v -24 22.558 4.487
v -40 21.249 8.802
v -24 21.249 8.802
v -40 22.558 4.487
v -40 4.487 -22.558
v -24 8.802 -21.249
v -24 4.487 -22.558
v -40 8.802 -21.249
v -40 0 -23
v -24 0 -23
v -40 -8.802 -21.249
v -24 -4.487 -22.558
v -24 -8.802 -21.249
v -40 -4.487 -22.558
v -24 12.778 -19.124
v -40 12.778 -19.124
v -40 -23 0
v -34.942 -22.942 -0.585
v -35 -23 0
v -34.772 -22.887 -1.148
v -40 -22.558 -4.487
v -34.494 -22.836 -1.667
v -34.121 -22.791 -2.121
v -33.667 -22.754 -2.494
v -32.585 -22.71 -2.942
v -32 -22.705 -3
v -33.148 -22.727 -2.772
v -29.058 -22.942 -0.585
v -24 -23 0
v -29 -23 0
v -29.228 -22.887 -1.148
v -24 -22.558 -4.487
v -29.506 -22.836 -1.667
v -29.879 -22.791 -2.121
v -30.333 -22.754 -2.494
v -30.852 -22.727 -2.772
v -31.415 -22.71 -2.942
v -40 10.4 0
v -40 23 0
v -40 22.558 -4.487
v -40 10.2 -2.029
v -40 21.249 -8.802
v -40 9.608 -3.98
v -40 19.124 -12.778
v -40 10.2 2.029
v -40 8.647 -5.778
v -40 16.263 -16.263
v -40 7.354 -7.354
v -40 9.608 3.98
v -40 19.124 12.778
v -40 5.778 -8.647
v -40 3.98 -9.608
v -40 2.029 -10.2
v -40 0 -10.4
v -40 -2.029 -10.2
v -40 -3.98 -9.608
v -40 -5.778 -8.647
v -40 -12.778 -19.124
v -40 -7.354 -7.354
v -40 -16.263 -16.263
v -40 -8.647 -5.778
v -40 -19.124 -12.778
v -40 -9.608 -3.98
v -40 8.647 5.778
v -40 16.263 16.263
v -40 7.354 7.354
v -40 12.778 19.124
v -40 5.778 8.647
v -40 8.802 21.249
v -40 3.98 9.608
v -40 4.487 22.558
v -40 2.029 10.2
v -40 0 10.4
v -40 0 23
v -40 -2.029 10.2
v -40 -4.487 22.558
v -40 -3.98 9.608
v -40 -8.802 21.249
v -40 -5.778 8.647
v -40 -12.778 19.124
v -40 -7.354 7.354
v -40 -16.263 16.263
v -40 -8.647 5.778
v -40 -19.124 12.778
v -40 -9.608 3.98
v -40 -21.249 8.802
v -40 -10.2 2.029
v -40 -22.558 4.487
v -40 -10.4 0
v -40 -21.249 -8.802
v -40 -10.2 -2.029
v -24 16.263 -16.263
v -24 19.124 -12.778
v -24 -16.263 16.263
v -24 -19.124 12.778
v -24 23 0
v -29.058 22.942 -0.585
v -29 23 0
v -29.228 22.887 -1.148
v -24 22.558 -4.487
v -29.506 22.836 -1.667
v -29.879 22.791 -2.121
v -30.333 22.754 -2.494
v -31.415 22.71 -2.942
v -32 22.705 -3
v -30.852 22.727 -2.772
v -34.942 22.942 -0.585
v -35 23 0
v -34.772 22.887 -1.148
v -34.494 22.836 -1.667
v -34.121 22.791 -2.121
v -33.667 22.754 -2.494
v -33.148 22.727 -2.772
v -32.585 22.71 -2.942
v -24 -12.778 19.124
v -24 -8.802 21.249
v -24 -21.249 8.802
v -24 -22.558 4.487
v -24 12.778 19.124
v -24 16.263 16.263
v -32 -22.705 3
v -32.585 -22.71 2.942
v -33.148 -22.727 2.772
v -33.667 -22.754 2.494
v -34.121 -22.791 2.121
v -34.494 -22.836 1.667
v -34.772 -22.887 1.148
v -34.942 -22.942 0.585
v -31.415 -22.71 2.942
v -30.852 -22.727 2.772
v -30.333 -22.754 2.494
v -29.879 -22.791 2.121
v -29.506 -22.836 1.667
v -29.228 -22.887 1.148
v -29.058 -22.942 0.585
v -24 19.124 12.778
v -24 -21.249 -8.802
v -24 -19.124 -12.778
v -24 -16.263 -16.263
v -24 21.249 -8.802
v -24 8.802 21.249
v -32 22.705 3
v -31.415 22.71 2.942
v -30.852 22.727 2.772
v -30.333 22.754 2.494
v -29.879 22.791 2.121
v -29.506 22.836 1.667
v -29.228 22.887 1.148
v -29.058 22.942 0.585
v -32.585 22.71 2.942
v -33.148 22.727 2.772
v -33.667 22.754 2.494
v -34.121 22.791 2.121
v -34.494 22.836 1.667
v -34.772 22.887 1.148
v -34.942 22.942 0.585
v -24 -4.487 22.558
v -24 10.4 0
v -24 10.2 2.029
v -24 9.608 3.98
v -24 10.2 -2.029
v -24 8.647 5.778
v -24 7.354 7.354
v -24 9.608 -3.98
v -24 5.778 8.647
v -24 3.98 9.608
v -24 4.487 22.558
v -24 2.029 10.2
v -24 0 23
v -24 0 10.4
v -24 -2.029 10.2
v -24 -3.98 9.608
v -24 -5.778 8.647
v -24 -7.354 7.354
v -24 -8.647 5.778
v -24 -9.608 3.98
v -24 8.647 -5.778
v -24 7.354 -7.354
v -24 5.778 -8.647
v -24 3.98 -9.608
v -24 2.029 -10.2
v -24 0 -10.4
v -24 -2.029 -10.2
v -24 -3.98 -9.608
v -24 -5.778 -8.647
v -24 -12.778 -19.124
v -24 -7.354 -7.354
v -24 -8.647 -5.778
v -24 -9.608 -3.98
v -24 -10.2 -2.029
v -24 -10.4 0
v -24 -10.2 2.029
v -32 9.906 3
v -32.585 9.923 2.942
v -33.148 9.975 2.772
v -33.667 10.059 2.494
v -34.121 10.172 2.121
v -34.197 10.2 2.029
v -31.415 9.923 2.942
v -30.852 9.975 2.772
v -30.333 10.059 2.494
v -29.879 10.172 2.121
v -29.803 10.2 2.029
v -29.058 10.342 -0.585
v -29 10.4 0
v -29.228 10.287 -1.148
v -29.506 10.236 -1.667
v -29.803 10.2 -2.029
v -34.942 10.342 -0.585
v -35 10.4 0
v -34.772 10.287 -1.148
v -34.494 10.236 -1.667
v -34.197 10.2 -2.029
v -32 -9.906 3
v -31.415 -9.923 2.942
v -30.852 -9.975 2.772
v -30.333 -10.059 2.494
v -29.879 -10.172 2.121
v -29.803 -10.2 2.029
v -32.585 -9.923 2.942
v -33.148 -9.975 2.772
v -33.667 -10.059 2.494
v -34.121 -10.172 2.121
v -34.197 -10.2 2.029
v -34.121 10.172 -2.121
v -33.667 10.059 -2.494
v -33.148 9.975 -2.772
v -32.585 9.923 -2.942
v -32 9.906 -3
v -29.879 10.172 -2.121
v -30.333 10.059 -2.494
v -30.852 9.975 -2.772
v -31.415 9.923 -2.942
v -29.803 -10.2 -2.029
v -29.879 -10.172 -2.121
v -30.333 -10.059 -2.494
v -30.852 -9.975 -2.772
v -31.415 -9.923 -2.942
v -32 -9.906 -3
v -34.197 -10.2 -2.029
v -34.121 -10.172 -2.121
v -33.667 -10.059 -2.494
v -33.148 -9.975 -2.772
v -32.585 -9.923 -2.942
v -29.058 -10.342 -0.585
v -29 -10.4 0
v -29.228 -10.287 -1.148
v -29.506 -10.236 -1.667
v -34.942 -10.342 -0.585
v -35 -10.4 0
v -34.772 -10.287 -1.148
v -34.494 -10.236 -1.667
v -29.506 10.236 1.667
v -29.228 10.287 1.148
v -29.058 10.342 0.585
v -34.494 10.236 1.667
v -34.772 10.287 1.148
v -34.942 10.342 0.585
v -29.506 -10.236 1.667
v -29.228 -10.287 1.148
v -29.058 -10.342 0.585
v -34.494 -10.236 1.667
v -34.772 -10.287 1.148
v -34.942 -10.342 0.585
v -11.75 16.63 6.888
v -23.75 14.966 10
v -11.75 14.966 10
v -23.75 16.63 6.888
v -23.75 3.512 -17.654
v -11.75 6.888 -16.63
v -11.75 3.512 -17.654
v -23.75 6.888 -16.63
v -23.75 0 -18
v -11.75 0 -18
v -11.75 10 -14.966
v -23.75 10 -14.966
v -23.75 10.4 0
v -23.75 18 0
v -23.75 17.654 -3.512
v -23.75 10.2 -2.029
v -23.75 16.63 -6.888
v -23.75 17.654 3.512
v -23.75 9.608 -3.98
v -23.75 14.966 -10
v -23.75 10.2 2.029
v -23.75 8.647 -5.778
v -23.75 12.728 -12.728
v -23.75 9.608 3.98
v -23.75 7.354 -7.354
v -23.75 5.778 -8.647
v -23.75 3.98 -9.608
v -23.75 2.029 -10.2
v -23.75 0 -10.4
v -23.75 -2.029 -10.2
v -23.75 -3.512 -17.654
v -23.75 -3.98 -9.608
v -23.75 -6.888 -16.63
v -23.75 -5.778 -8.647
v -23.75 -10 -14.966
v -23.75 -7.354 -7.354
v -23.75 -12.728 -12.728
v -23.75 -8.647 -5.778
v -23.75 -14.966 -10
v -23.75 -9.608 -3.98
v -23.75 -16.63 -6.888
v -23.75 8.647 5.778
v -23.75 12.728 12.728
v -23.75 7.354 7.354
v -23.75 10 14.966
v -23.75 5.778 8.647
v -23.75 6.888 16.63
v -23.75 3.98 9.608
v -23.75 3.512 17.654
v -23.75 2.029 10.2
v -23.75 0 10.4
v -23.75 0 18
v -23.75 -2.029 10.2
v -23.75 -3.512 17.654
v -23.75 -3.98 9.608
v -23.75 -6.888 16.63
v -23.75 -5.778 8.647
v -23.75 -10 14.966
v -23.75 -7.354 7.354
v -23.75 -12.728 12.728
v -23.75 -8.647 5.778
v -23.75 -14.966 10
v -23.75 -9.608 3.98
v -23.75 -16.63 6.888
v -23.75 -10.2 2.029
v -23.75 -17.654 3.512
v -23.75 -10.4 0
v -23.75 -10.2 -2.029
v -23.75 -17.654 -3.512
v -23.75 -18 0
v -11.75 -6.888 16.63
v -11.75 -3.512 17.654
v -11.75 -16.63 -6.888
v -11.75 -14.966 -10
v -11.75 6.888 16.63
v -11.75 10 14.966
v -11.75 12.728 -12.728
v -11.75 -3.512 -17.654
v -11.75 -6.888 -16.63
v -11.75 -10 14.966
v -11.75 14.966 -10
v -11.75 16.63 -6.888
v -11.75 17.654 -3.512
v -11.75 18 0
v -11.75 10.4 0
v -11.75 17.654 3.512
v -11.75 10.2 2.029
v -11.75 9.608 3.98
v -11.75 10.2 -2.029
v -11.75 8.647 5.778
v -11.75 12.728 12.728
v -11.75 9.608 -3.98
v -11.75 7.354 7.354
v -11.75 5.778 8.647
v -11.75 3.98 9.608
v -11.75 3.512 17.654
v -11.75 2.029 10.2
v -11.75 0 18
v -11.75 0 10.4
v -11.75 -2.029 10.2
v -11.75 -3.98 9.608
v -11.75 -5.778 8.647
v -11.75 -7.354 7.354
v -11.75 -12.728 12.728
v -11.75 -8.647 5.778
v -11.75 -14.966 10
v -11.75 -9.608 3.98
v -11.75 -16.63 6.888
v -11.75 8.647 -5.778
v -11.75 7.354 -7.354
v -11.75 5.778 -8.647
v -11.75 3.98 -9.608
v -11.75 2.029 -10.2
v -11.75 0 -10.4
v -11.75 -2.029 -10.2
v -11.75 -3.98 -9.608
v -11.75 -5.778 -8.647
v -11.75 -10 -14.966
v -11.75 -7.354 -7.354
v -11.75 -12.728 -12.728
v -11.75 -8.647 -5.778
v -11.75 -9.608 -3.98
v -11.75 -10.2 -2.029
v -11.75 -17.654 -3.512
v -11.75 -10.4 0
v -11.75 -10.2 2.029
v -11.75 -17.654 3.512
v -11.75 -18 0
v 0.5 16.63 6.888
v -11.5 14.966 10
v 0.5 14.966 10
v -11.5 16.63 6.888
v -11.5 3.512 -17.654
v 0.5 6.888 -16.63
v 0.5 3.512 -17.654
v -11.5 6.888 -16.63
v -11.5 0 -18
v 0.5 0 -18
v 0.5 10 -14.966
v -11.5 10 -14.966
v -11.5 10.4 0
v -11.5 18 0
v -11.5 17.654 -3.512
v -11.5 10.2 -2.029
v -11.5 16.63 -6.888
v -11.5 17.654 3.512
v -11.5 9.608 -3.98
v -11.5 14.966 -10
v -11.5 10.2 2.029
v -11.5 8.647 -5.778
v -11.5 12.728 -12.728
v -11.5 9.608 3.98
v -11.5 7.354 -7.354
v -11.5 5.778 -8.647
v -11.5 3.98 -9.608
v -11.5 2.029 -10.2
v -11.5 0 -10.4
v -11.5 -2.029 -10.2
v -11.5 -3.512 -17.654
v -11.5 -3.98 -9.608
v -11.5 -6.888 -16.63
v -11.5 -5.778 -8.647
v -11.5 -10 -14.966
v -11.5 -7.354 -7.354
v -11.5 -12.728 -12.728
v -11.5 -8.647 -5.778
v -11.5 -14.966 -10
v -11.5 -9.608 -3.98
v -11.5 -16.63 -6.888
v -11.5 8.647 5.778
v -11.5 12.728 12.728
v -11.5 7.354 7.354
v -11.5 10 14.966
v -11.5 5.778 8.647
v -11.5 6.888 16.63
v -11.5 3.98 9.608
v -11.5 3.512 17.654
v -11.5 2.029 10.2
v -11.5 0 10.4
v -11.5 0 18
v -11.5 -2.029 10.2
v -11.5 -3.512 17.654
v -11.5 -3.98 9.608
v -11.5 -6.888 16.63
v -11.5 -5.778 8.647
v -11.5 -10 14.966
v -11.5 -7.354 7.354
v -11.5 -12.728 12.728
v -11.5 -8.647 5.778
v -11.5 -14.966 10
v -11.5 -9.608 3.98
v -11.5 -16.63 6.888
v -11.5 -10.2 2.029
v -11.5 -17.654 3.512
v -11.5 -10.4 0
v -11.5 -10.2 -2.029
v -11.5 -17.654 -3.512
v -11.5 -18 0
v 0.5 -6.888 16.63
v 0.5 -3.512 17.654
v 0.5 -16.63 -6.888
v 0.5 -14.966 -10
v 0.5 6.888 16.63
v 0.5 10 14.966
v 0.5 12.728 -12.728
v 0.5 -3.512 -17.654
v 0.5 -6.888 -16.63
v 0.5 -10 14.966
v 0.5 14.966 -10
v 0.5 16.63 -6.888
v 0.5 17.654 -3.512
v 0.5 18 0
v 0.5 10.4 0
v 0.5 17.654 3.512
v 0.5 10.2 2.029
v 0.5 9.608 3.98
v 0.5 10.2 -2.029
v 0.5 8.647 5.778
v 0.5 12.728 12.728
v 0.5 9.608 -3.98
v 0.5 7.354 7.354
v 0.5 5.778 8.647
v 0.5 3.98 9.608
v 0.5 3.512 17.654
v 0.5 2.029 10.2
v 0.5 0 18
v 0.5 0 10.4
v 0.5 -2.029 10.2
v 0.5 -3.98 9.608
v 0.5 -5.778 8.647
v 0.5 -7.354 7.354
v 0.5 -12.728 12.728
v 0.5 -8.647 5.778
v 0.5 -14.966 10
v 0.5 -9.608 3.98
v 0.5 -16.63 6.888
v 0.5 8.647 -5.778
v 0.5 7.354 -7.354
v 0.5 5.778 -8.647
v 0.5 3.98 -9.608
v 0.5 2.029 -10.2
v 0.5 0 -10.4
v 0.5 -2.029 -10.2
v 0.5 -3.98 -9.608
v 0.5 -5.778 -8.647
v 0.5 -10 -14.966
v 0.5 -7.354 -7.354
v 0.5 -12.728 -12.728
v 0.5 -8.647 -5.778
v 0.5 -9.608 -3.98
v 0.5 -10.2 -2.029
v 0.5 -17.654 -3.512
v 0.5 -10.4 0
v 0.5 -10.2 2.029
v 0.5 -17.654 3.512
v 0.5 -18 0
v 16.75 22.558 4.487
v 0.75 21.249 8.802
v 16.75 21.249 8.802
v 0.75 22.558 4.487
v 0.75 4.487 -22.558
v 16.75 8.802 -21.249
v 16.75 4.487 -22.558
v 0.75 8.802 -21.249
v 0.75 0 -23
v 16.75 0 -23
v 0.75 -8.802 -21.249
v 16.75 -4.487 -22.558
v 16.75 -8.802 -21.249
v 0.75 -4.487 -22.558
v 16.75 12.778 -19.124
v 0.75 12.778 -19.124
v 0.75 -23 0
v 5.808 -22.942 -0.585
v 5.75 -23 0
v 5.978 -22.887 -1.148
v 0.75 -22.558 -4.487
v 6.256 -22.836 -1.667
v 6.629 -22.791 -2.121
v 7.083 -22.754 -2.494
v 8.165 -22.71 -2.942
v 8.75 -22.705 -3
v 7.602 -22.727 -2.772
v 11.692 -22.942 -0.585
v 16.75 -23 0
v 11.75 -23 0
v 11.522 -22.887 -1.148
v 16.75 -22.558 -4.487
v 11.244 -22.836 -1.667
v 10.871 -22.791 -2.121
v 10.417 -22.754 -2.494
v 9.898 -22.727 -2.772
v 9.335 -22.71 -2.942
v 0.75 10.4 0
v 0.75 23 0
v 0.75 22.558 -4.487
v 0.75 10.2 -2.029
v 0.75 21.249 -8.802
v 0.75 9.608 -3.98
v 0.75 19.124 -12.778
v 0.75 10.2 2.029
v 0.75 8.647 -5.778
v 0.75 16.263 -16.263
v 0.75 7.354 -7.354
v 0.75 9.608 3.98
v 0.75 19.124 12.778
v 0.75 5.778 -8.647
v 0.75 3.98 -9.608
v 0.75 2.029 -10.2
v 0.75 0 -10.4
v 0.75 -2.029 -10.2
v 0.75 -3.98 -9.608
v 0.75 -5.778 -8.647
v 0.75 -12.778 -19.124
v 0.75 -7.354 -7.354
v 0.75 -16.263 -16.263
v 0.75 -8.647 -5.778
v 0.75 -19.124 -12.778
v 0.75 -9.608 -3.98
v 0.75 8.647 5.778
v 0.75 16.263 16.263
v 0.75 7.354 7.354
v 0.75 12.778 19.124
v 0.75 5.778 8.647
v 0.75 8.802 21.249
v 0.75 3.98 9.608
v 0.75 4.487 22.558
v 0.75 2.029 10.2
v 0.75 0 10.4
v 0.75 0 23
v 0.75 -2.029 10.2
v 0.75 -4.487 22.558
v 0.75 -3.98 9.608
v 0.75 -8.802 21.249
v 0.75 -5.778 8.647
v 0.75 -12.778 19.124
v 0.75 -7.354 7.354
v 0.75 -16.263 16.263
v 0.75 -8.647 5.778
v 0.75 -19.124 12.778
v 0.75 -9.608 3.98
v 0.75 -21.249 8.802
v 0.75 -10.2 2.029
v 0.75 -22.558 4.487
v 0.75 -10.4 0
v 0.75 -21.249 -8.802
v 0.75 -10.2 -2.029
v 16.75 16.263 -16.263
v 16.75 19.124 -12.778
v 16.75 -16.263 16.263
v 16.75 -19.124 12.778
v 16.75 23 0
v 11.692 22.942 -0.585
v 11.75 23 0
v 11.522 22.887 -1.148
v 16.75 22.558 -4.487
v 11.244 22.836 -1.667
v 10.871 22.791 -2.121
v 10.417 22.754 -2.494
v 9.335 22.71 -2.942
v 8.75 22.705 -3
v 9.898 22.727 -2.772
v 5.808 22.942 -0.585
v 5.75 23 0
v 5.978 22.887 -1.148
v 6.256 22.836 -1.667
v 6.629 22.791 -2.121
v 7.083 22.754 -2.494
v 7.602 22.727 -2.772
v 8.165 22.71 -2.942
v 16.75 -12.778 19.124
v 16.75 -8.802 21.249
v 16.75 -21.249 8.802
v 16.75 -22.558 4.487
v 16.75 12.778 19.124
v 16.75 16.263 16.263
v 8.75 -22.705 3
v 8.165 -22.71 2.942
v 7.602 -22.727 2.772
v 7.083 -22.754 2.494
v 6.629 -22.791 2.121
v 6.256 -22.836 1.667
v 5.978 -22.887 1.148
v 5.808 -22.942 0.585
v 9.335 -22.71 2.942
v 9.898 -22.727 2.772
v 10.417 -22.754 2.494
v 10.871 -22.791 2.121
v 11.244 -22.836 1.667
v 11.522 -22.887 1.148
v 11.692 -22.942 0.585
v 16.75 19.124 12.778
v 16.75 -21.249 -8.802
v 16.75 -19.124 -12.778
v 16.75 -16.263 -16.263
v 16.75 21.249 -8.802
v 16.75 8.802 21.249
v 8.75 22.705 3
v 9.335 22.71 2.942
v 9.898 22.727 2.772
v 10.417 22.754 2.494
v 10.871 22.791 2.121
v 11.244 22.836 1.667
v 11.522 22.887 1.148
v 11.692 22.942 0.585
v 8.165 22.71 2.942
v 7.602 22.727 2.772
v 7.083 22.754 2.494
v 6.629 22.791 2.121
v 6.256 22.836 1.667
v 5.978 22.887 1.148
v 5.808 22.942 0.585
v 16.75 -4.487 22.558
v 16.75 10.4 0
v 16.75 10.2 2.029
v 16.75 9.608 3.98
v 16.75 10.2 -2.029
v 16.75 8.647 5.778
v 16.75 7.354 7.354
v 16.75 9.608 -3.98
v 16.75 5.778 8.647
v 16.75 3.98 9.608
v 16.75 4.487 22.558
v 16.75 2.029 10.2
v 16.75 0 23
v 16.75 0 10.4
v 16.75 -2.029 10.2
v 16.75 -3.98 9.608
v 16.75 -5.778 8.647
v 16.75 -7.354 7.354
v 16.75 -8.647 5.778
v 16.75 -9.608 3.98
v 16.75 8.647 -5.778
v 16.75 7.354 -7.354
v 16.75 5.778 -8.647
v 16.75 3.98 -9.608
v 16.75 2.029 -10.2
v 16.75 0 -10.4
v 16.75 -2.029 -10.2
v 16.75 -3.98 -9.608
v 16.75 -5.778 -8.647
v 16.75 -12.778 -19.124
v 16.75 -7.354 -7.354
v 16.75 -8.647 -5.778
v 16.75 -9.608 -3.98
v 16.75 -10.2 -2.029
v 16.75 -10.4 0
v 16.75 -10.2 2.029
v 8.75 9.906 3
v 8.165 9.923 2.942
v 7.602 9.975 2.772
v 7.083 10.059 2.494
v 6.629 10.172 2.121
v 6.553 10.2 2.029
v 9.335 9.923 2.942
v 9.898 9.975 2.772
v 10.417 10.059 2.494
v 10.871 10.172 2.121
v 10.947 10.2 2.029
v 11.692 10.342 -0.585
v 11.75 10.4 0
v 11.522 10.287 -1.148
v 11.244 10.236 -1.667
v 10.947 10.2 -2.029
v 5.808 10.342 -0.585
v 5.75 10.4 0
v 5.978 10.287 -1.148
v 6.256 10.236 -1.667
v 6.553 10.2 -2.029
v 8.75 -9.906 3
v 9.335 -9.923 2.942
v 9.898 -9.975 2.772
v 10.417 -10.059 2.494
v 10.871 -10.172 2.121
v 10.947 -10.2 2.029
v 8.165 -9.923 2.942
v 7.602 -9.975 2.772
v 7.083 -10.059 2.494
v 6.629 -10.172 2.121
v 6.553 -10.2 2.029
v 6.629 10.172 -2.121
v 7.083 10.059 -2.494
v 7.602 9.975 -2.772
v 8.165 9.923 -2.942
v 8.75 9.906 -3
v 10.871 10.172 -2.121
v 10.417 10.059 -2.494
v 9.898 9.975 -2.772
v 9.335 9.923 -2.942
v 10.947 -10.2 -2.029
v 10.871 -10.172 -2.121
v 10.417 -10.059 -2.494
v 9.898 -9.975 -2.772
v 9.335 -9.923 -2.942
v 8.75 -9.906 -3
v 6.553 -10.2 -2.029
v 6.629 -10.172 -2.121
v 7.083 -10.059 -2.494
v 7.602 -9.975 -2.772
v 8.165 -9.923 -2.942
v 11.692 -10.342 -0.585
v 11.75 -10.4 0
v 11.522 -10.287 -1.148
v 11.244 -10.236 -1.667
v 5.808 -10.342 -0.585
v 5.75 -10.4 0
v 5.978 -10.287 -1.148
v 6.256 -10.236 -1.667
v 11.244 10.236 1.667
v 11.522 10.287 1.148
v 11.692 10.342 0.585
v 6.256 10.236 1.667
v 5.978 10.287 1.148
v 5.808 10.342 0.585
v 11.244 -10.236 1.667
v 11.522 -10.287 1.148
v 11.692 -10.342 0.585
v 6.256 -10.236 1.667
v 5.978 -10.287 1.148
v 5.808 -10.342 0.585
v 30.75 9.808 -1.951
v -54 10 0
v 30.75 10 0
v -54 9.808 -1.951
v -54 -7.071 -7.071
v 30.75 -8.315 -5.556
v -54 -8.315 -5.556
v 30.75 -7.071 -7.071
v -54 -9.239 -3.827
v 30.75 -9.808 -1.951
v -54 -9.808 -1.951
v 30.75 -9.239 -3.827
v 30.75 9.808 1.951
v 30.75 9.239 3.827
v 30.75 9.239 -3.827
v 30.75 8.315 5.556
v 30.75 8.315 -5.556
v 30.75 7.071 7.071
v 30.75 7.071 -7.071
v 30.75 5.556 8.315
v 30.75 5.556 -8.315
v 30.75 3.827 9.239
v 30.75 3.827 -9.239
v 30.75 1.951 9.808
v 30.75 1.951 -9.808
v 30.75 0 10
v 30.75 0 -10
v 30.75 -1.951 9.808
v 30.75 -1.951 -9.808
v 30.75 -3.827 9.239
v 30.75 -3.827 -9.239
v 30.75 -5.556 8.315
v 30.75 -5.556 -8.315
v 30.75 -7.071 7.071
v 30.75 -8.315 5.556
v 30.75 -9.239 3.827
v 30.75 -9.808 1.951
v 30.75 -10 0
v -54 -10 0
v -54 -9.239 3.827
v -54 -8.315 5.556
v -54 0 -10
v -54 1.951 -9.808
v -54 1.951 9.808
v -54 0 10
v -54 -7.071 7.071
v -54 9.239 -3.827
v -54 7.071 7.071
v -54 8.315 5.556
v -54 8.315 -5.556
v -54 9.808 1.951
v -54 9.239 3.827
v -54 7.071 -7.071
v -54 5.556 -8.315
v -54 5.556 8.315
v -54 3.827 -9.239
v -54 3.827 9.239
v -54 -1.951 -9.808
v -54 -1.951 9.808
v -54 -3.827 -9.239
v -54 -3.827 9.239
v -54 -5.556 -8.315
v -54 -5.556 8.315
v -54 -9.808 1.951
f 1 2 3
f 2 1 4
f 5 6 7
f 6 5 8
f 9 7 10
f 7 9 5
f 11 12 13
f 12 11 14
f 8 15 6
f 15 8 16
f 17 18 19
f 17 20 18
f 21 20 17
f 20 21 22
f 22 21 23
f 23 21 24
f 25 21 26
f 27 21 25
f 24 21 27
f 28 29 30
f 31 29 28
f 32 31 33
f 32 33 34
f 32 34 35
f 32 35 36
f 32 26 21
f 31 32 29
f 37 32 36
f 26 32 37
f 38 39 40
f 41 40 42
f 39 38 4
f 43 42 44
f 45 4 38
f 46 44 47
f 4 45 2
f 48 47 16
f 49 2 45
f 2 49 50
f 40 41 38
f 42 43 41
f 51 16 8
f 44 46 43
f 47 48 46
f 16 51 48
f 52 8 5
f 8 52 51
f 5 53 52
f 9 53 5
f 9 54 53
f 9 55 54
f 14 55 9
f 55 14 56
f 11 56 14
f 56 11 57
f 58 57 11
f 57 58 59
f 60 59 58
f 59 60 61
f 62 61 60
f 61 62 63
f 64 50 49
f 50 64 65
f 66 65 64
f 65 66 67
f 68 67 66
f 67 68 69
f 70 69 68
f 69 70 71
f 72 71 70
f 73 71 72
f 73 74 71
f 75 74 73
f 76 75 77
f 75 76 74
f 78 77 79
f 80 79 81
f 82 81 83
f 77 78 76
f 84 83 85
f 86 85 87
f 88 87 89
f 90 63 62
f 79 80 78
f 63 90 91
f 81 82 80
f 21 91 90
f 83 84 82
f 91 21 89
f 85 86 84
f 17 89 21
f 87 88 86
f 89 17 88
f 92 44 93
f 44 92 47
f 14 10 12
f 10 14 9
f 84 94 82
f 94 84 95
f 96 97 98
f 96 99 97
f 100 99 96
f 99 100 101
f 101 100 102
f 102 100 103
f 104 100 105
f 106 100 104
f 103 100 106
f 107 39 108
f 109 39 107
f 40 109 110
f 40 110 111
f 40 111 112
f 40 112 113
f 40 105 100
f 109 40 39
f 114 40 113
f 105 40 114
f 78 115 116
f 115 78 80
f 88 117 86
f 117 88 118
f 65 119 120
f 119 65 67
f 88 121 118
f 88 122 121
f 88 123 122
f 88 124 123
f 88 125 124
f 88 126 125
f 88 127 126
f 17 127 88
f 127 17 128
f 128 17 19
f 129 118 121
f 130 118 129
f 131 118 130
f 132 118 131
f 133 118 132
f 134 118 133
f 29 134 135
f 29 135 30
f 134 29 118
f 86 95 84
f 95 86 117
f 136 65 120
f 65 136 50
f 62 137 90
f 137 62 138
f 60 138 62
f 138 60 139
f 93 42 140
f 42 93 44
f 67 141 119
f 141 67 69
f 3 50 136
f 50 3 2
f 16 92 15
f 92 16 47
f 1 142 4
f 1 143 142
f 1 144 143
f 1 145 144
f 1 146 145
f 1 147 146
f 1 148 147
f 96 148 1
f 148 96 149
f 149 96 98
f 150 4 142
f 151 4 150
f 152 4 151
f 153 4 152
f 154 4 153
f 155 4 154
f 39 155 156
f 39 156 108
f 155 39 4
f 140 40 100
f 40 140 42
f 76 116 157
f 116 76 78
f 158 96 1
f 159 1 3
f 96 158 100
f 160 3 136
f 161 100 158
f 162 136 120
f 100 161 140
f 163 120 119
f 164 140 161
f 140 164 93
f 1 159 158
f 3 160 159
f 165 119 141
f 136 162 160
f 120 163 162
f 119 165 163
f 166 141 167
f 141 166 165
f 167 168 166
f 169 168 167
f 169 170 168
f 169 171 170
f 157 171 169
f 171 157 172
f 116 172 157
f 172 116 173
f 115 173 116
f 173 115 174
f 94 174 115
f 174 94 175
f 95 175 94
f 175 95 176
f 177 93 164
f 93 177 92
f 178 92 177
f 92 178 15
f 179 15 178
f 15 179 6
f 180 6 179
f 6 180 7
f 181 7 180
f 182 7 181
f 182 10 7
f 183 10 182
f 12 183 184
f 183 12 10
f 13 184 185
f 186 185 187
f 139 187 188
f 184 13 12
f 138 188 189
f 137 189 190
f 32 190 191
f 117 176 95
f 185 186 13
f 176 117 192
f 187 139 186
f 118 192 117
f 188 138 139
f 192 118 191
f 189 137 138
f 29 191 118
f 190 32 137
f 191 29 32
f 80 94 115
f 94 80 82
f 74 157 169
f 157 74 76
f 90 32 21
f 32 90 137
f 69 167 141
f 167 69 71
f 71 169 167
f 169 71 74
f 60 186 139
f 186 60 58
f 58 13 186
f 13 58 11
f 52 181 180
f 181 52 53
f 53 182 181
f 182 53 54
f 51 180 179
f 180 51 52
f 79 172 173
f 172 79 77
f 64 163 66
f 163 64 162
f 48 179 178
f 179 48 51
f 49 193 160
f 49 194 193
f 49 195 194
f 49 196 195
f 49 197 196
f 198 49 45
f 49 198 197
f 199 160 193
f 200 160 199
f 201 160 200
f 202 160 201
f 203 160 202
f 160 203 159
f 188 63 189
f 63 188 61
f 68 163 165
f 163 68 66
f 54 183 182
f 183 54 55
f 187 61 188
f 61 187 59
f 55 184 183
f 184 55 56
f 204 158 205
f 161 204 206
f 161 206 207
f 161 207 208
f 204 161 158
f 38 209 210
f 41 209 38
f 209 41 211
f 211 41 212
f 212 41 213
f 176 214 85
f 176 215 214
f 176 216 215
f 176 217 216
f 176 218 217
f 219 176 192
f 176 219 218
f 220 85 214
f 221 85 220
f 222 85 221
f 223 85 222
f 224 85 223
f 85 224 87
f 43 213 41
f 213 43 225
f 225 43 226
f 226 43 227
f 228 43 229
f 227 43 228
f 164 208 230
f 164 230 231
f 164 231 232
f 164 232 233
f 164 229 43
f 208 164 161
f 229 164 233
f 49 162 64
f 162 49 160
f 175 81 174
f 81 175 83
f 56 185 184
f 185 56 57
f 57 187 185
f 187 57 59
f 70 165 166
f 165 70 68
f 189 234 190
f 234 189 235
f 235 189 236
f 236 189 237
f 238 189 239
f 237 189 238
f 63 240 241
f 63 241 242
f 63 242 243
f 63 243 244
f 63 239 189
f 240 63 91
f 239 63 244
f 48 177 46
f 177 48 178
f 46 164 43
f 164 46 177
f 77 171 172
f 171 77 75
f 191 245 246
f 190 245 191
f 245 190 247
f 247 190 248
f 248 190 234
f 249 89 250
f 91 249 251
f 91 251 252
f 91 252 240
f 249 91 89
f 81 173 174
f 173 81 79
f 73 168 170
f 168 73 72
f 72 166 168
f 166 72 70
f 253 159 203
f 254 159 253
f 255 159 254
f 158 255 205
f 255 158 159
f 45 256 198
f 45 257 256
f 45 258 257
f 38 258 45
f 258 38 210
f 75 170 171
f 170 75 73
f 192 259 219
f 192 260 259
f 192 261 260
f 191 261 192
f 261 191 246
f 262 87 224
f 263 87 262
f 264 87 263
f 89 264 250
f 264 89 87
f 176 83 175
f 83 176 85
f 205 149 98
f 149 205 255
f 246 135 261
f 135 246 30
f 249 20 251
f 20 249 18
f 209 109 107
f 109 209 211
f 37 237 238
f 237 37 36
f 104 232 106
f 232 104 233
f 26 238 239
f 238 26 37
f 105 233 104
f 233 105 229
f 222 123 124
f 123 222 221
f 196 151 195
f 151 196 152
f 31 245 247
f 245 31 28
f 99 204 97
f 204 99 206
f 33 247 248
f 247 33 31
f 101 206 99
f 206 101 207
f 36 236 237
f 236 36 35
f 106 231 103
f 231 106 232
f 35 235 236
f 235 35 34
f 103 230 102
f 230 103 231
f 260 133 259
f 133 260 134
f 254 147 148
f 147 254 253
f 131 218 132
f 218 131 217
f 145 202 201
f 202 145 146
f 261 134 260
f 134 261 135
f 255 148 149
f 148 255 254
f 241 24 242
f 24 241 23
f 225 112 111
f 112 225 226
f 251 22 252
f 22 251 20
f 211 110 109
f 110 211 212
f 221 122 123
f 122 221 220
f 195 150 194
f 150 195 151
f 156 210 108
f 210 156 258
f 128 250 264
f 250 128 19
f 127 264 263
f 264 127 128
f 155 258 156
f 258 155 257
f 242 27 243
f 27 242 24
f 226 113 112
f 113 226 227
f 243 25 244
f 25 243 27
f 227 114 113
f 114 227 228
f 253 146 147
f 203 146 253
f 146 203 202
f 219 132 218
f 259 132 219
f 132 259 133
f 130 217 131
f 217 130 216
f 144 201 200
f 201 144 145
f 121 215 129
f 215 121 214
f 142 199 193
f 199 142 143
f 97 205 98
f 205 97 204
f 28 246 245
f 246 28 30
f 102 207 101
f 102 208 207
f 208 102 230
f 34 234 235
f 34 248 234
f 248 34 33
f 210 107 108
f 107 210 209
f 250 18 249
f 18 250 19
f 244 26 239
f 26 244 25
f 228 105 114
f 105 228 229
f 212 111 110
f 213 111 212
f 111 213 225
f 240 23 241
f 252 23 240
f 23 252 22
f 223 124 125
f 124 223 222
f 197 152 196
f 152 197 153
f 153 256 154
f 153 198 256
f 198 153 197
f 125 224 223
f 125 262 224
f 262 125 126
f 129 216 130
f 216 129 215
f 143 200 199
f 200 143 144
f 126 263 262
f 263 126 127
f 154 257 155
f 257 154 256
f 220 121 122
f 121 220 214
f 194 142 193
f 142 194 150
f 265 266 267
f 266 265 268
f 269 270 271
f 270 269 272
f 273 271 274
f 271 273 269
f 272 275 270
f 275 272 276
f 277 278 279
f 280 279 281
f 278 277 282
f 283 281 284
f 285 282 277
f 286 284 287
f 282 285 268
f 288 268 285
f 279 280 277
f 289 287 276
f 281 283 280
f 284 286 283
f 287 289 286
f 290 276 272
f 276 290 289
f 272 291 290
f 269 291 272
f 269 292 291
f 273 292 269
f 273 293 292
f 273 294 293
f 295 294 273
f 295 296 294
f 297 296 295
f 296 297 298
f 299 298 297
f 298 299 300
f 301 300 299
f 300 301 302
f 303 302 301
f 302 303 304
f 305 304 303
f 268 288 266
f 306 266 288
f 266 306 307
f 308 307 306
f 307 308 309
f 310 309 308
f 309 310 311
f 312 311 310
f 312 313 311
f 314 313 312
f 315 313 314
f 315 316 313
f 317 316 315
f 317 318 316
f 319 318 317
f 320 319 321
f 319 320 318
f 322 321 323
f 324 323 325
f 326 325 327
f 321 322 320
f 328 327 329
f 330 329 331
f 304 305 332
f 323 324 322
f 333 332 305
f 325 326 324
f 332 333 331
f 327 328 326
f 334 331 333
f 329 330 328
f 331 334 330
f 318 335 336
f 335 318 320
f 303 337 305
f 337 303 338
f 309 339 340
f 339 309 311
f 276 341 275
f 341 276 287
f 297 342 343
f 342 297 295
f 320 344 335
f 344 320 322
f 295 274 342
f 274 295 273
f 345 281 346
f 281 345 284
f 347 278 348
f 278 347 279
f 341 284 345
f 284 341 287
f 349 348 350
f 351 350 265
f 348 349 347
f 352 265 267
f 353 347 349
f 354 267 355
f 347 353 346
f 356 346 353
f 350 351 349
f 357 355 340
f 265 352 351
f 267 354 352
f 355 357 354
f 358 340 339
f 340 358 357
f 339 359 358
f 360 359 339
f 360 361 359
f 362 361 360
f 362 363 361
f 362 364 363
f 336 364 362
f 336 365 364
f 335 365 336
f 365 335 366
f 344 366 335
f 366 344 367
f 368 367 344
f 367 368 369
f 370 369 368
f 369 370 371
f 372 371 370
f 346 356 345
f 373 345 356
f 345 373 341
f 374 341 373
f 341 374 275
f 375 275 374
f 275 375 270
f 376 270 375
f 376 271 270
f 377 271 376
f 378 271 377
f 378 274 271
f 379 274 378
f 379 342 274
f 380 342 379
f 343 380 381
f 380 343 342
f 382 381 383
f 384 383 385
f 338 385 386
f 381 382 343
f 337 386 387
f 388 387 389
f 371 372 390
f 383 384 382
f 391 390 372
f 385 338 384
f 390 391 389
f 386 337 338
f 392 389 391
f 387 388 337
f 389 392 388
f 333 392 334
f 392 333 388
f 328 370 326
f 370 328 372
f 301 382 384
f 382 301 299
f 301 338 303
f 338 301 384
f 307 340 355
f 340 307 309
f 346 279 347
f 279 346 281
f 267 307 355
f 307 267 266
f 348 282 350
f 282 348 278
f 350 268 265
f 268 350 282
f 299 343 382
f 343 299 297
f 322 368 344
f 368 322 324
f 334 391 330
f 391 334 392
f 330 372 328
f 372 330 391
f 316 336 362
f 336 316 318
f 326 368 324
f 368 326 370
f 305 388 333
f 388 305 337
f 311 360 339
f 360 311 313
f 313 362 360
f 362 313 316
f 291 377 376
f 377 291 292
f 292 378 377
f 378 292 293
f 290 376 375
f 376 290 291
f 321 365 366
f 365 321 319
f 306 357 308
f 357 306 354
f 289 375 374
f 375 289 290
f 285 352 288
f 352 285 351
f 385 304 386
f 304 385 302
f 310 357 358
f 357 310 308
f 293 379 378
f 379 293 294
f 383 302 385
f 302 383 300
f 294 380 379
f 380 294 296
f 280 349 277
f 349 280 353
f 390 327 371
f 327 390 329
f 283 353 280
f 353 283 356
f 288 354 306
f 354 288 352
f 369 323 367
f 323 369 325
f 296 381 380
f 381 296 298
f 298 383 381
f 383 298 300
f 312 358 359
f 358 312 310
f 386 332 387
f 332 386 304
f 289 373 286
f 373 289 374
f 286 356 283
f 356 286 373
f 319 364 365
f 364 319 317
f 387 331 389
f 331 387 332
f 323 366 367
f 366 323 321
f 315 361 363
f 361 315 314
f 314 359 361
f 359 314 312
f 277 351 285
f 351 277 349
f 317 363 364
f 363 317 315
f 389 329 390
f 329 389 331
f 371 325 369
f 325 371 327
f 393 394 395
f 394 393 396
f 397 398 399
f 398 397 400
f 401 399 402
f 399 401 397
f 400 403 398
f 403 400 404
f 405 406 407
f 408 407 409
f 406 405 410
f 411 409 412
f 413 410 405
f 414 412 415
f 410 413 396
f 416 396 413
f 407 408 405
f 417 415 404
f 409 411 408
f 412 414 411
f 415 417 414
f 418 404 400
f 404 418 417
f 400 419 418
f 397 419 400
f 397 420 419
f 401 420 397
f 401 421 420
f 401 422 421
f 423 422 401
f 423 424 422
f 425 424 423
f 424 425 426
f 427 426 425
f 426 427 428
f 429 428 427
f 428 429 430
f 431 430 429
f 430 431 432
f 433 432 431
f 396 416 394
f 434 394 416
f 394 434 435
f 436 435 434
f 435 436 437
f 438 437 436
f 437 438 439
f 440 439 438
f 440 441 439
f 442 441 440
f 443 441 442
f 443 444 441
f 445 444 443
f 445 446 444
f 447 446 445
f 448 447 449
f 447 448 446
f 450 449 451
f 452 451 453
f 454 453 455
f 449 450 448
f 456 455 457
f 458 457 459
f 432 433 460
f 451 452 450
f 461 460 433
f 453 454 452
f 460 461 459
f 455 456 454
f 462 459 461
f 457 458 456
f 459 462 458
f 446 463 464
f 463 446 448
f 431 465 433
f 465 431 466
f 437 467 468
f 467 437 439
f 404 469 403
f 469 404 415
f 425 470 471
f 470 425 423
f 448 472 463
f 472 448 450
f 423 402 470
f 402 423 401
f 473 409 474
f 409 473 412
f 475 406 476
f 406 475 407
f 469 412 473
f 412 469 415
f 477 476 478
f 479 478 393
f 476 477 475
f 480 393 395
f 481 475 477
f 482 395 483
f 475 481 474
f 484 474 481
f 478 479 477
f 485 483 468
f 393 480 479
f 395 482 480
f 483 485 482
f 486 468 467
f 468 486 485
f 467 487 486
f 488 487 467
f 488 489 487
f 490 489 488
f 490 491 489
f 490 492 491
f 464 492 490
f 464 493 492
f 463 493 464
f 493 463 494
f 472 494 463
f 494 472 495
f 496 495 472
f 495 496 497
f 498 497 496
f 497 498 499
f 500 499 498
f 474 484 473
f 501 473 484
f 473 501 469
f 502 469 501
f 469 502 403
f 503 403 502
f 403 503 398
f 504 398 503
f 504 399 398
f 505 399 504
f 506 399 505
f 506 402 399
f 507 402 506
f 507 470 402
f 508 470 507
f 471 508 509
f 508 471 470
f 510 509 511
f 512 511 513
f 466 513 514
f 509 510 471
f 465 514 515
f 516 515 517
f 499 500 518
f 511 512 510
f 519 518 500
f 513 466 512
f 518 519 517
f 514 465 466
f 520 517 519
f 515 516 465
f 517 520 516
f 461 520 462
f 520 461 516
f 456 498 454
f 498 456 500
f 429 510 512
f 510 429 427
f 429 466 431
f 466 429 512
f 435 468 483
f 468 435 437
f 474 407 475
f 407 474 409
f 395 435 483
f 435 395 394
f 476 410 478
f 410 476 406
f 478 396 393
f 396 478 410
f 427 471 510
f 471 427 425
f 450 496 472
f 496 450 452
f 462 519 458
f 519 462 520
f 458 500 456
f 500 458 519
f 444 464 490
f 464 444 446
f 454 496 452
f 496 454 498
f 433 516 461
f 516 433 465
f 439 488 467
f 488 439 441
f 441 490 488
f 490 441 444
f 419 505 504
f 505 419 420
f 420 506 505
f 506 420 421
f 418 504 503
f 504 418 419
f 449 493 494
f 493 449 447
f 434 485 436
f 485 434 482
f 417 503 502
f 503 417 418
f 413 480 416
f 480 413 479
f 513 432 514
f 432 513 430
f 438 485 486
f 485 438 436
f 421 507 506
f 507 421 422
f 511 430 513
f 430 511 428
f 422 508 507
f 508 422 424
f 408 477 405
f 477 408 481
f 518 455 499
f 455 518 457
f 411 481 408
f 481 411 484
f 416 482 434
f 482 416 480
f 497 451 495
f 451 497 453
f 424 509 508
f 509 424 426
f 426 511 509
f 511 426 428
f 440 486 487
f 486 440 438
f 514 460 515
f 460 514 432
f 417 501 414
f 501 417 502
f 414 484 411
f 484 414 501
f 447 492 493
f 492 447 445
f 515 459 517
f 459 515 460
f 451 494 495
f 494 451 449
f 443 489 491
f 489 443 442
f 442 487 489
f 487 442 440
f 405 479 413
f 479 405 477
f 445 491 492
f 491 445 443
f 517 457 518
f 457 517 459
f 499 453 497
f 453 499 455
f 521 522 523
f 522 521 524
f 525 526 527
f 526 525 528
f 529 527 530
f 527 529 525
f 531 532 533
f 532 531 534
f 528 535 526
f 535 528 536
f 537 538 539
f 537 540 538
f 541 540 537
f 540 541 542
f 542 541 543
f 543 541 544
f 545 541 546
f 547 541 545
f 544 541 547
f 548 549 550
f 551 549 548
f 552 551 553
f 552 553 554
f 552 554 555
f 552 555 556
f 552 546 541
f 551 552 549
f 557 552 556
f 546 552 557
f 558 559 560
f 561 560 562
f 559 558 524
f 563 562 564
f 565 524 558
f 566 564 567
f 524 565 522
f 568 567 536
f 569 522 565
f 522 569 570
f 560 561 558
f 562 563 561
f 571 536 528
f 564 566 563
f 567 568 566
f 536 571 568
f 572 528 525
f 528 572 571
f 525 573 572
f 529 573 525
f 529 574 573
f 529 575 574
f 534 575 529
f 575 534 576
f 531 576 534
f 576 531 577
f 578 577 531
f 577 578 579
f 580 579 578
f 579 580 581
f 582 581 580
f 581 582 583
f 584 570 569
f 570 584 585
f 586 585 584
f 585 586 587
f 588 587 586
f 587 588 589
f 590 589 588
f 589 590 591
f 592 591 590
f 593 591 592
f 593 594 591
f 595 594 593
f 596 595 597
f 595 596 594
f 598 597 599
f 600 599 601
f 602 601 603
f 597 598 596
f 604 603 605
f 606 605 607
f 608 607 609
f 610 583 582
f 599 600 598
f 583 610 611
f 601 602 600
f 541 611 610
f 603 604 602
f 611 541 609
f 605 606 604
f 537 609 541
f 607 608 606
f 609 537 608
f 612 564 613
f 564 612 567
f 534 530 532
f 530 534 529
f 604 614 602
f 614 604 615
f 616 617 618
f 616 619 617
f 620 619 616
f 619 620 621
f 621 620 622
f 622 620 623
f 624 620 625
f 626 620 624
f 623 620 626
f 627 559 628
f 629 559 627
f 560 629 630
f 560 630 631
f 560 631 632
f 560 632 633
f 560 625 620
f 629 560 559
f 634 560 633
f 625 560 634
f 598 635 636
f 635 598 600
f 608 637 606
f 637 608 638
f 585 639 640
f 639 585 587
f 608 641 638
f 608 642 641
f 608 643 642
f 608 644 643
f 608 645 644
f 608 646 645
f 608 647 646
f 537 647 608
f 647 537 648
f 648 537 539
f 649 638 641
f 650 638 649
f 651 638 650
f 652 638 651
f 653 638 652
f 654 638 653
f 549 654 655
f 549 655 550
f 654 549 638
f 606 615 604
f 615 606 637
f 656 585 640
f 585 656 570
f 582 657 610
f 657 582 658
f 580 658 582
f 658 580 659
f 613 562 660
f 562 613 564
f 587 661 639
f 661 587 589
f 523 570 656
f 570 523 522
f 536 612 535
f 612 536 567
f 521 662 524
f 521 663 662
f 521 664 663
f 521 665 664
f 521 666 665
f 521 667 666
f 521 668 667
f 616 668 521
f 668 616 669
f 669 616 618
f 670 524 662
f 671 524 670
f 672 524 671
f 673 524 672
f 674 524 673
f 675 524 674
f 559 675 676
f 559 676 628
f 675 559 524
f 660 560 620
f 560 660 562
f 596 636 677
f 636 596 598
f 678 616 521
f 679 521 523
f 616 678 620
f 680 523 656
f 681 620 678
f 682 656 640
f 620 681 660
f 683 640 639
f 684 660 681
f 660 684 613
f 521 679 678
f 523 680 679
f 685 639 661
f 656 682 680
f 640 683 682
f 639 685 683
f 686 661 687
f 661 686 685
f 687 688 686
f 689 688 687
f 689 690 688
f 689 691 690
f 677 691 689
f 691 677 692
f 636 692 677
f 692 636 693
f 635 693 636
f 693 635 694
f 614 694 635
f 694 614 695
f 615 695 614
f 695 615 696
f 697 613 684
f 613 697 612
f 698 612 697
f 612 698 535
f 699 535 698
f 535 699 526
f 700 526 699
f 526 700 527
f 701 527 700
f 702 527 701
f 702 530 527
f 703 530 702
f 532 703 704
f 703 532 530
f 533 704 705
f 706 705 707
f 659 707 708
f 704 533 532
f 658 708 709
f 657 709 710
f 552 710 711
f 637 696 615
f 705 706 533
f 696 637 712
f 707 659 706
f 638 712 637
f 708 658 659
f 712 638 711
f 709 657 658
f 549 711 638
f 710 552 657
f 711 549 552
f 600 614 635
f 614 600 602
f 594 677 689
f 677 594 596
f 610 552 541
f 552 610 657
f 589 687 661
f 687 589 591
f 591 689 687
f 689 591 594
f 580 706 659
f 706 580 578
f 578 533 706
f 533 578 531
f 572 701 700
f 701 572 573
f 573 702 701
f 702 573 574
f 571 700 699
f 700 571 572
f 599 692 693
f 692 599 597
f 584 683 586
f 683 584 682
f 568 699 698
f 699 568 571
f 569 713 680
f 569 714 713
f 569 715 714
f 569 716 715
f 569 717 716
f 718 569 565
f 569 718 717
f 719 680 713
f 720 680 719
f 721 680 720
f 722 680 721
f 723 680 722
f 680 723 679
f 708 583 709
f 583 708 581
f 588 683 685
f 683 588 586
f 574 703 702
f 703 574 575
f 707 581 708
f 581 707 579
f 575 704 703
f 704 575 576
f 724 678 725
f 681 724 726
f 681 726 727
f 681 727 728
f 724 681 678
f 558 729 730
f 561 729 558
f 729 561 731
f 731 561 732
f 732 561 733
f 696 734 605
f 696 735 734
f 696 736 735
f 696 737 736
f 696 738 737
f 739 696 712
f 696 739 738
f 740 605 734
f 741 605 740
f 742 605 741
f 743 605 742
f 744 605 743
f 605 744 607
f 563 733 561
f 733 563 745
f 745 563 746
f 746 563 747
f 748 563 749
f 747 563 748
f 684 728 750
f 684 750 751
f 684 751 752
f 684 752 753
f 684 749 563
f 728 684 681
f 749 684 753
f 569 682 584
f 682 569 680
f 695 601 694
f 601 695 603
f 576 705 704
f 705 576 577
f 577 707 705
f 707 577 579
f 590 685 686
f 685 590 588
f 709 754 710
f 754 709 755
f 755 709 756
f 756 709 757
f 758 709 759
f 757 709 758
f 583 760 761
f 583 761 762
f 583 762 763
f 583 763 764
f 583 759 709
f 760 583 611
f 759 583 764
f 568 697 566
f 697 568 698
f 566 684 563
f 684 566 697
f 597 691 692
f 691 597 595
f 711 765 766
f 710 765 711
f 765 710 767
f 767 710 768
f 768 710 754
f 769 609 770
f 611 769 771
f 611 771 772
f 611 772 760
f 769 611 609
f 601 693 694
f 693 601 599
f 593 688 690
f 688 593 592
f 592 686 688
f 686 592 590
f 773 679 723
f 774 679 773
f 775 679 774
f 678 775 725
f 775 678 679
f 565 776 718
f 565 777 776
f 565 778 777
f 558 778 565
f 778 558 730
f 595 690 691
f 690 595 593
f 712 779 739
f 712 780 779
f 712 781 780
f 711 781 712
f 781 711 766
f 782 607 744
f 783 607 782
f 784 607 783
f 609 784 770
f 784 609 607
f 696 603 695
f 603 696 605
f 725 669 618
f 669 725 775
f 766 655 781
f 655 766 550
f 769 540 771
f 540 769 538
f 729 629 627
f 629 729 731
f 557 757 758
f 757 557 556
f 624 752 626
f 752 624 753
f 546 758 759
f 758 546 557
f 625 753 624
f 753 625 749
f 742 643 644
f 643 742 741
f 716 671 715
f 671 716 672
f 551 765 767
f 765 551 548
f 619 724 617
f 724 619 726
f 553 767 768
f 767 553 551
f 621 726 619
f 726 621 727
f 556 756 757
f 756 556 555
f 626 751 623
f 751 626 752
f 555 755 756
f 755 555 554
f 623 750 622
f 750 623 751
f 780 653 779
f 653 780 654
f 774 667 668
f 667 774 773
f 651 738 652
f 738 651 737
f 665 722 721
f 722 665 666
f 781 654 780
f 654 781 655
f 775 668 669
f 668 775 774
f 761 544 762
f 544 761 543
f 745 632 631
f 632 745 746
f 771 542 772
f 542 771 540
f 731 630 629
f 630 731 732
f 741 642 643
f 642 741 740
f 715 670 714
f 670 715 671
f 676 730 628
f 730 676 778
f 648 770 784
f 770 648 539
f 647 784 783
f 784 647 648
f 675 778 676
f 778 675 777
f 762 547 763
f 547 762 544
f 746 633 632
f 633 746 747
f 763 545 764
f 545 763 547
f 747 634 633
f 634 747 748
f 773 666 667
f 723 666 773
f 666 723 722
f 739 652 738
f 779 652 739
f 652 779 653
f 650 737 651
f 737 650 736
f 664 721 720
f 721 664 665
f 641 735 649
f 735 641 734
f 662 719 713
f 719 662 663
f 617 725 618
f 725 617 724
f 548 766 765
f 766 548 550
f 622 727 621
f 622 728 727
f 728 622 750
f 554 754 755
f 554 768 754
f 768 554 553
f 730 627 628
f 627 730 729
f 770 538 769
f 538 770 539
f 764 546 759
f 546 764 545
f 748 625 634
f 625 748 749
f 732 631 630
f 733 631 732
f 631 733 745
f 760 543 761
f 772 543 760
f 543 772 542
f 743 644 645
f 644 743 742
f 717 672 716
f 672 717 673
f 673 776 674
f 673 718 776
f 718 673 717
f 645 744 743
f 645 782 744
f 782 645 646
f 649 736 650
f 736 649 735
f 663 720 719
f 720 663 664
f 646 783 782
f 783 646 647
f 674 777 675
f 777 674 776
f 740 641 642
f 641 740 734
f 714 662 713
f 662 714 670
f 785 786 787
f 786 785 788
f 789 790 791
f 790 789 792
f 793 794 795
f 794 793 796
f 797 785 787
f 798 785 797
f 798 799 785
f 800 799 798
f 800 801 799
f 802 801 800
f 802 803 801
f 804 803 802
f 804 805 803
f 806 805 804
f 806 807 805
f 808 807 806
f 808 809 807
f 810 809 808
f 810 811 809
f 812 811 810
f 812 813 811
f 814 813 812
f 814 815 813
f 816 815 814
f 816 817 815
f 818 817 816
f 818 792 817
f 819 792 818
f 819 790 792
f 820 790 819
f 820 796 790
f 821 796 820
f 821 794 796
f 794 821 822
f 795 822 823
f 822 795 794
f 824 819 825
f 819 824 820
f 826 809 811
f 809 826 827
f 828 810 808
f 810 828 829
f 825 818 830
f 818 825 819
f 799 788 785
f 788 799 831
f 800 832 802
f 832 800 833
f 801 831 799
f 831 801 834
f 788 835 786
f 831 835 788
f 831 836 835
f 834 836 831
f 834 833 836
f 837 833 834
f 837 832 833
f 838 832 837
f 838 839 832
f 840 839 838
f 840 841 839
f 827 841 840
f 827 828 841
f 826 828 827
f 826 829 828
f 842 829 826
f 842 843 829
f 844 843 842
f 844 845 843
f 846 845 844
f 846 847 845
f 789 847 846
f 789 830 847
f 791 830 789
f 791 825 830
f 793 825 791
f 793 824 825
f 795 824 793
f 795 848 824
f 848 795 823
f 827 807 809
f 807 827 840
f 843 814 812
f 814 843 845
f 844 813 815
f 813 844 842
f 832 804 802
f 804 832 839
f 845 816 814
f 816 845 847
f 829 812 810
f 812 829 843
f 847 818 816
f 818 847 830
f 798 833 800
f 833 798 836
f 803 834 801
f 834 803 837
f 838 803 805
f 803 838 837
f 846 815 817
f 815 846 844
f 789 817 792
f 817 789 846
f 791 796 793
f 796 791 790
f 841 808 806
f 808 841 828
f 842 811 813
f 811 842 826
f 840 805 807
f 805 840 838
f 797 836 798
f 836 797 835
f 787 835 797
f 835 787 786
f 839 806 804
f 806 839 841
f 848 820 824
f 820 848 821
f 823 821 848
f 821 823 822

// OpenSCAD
$fn = 32;

// ------------------------------------------------------------------------
// Shaft with rings and collars: d20 shaft, 4 rings
// Every part is its own module, assembly() places them once.
// ------------------------------------------------------------------------

// --- part 1 ---
module shaft() {
  translate([0, 0, -42.375]) cylinder(h = 84.75, d = 20);
}

// --- part 2 ---
module collar_a() {
  difference() {
    cylinder(h = 16, d = 46);
    translate([0, 0, -1]) cylinder(h = 18, d = 20.8);
    translate([0, 0, 8]) rotate([90, 0, 0]) cylinder(h = 48, d = 6, center = true);
  }
}

// --- part 3 ---
module spacer_a() {
  difference() {
      translate([0, 0, 0]) cylinder(h = 12, d = 36);
      translate([0, 0, -1]) cylinder(h = 14, d = 20.8);
    }
}

// --- part 4 ---
module spacer_b() {
  difference() {
      translate([0, 0, 0]) cylinder(h = 12, d = 36);
      translate([0, 0, -1]) cylinder(h = 14, d = 20.8);
    }
}

// --- part 5 ---
module collar_b() {
  difference() {
    cylinder(h = 16, d = 46);
    translate([0, 0, -1]) cylinder(h = 18, d = 20.8);
    translate([0, 0, 8]) rotate([90, 0, 0]) cylinder(h = 48, d = 6, center = true);
  }
}

// --- assembly ---
module assembly() {
  translate([-11.625, 0, 0]) rotate([0, 90, 0]) shaft();
  translate([-40, 0, 0]) rotate([0, 90, 0]) collar_a();
  translate([-23.75, 0, 0]) rotate([0, 90, 0]) spacer_a();
  translate([-11.5, 0, 0]) rotate([0, 90, 0]) spacer_b();
  translate([0.75, 0, 0]) rotate([0, 90, 0]) collar_b();
}

assembly();
